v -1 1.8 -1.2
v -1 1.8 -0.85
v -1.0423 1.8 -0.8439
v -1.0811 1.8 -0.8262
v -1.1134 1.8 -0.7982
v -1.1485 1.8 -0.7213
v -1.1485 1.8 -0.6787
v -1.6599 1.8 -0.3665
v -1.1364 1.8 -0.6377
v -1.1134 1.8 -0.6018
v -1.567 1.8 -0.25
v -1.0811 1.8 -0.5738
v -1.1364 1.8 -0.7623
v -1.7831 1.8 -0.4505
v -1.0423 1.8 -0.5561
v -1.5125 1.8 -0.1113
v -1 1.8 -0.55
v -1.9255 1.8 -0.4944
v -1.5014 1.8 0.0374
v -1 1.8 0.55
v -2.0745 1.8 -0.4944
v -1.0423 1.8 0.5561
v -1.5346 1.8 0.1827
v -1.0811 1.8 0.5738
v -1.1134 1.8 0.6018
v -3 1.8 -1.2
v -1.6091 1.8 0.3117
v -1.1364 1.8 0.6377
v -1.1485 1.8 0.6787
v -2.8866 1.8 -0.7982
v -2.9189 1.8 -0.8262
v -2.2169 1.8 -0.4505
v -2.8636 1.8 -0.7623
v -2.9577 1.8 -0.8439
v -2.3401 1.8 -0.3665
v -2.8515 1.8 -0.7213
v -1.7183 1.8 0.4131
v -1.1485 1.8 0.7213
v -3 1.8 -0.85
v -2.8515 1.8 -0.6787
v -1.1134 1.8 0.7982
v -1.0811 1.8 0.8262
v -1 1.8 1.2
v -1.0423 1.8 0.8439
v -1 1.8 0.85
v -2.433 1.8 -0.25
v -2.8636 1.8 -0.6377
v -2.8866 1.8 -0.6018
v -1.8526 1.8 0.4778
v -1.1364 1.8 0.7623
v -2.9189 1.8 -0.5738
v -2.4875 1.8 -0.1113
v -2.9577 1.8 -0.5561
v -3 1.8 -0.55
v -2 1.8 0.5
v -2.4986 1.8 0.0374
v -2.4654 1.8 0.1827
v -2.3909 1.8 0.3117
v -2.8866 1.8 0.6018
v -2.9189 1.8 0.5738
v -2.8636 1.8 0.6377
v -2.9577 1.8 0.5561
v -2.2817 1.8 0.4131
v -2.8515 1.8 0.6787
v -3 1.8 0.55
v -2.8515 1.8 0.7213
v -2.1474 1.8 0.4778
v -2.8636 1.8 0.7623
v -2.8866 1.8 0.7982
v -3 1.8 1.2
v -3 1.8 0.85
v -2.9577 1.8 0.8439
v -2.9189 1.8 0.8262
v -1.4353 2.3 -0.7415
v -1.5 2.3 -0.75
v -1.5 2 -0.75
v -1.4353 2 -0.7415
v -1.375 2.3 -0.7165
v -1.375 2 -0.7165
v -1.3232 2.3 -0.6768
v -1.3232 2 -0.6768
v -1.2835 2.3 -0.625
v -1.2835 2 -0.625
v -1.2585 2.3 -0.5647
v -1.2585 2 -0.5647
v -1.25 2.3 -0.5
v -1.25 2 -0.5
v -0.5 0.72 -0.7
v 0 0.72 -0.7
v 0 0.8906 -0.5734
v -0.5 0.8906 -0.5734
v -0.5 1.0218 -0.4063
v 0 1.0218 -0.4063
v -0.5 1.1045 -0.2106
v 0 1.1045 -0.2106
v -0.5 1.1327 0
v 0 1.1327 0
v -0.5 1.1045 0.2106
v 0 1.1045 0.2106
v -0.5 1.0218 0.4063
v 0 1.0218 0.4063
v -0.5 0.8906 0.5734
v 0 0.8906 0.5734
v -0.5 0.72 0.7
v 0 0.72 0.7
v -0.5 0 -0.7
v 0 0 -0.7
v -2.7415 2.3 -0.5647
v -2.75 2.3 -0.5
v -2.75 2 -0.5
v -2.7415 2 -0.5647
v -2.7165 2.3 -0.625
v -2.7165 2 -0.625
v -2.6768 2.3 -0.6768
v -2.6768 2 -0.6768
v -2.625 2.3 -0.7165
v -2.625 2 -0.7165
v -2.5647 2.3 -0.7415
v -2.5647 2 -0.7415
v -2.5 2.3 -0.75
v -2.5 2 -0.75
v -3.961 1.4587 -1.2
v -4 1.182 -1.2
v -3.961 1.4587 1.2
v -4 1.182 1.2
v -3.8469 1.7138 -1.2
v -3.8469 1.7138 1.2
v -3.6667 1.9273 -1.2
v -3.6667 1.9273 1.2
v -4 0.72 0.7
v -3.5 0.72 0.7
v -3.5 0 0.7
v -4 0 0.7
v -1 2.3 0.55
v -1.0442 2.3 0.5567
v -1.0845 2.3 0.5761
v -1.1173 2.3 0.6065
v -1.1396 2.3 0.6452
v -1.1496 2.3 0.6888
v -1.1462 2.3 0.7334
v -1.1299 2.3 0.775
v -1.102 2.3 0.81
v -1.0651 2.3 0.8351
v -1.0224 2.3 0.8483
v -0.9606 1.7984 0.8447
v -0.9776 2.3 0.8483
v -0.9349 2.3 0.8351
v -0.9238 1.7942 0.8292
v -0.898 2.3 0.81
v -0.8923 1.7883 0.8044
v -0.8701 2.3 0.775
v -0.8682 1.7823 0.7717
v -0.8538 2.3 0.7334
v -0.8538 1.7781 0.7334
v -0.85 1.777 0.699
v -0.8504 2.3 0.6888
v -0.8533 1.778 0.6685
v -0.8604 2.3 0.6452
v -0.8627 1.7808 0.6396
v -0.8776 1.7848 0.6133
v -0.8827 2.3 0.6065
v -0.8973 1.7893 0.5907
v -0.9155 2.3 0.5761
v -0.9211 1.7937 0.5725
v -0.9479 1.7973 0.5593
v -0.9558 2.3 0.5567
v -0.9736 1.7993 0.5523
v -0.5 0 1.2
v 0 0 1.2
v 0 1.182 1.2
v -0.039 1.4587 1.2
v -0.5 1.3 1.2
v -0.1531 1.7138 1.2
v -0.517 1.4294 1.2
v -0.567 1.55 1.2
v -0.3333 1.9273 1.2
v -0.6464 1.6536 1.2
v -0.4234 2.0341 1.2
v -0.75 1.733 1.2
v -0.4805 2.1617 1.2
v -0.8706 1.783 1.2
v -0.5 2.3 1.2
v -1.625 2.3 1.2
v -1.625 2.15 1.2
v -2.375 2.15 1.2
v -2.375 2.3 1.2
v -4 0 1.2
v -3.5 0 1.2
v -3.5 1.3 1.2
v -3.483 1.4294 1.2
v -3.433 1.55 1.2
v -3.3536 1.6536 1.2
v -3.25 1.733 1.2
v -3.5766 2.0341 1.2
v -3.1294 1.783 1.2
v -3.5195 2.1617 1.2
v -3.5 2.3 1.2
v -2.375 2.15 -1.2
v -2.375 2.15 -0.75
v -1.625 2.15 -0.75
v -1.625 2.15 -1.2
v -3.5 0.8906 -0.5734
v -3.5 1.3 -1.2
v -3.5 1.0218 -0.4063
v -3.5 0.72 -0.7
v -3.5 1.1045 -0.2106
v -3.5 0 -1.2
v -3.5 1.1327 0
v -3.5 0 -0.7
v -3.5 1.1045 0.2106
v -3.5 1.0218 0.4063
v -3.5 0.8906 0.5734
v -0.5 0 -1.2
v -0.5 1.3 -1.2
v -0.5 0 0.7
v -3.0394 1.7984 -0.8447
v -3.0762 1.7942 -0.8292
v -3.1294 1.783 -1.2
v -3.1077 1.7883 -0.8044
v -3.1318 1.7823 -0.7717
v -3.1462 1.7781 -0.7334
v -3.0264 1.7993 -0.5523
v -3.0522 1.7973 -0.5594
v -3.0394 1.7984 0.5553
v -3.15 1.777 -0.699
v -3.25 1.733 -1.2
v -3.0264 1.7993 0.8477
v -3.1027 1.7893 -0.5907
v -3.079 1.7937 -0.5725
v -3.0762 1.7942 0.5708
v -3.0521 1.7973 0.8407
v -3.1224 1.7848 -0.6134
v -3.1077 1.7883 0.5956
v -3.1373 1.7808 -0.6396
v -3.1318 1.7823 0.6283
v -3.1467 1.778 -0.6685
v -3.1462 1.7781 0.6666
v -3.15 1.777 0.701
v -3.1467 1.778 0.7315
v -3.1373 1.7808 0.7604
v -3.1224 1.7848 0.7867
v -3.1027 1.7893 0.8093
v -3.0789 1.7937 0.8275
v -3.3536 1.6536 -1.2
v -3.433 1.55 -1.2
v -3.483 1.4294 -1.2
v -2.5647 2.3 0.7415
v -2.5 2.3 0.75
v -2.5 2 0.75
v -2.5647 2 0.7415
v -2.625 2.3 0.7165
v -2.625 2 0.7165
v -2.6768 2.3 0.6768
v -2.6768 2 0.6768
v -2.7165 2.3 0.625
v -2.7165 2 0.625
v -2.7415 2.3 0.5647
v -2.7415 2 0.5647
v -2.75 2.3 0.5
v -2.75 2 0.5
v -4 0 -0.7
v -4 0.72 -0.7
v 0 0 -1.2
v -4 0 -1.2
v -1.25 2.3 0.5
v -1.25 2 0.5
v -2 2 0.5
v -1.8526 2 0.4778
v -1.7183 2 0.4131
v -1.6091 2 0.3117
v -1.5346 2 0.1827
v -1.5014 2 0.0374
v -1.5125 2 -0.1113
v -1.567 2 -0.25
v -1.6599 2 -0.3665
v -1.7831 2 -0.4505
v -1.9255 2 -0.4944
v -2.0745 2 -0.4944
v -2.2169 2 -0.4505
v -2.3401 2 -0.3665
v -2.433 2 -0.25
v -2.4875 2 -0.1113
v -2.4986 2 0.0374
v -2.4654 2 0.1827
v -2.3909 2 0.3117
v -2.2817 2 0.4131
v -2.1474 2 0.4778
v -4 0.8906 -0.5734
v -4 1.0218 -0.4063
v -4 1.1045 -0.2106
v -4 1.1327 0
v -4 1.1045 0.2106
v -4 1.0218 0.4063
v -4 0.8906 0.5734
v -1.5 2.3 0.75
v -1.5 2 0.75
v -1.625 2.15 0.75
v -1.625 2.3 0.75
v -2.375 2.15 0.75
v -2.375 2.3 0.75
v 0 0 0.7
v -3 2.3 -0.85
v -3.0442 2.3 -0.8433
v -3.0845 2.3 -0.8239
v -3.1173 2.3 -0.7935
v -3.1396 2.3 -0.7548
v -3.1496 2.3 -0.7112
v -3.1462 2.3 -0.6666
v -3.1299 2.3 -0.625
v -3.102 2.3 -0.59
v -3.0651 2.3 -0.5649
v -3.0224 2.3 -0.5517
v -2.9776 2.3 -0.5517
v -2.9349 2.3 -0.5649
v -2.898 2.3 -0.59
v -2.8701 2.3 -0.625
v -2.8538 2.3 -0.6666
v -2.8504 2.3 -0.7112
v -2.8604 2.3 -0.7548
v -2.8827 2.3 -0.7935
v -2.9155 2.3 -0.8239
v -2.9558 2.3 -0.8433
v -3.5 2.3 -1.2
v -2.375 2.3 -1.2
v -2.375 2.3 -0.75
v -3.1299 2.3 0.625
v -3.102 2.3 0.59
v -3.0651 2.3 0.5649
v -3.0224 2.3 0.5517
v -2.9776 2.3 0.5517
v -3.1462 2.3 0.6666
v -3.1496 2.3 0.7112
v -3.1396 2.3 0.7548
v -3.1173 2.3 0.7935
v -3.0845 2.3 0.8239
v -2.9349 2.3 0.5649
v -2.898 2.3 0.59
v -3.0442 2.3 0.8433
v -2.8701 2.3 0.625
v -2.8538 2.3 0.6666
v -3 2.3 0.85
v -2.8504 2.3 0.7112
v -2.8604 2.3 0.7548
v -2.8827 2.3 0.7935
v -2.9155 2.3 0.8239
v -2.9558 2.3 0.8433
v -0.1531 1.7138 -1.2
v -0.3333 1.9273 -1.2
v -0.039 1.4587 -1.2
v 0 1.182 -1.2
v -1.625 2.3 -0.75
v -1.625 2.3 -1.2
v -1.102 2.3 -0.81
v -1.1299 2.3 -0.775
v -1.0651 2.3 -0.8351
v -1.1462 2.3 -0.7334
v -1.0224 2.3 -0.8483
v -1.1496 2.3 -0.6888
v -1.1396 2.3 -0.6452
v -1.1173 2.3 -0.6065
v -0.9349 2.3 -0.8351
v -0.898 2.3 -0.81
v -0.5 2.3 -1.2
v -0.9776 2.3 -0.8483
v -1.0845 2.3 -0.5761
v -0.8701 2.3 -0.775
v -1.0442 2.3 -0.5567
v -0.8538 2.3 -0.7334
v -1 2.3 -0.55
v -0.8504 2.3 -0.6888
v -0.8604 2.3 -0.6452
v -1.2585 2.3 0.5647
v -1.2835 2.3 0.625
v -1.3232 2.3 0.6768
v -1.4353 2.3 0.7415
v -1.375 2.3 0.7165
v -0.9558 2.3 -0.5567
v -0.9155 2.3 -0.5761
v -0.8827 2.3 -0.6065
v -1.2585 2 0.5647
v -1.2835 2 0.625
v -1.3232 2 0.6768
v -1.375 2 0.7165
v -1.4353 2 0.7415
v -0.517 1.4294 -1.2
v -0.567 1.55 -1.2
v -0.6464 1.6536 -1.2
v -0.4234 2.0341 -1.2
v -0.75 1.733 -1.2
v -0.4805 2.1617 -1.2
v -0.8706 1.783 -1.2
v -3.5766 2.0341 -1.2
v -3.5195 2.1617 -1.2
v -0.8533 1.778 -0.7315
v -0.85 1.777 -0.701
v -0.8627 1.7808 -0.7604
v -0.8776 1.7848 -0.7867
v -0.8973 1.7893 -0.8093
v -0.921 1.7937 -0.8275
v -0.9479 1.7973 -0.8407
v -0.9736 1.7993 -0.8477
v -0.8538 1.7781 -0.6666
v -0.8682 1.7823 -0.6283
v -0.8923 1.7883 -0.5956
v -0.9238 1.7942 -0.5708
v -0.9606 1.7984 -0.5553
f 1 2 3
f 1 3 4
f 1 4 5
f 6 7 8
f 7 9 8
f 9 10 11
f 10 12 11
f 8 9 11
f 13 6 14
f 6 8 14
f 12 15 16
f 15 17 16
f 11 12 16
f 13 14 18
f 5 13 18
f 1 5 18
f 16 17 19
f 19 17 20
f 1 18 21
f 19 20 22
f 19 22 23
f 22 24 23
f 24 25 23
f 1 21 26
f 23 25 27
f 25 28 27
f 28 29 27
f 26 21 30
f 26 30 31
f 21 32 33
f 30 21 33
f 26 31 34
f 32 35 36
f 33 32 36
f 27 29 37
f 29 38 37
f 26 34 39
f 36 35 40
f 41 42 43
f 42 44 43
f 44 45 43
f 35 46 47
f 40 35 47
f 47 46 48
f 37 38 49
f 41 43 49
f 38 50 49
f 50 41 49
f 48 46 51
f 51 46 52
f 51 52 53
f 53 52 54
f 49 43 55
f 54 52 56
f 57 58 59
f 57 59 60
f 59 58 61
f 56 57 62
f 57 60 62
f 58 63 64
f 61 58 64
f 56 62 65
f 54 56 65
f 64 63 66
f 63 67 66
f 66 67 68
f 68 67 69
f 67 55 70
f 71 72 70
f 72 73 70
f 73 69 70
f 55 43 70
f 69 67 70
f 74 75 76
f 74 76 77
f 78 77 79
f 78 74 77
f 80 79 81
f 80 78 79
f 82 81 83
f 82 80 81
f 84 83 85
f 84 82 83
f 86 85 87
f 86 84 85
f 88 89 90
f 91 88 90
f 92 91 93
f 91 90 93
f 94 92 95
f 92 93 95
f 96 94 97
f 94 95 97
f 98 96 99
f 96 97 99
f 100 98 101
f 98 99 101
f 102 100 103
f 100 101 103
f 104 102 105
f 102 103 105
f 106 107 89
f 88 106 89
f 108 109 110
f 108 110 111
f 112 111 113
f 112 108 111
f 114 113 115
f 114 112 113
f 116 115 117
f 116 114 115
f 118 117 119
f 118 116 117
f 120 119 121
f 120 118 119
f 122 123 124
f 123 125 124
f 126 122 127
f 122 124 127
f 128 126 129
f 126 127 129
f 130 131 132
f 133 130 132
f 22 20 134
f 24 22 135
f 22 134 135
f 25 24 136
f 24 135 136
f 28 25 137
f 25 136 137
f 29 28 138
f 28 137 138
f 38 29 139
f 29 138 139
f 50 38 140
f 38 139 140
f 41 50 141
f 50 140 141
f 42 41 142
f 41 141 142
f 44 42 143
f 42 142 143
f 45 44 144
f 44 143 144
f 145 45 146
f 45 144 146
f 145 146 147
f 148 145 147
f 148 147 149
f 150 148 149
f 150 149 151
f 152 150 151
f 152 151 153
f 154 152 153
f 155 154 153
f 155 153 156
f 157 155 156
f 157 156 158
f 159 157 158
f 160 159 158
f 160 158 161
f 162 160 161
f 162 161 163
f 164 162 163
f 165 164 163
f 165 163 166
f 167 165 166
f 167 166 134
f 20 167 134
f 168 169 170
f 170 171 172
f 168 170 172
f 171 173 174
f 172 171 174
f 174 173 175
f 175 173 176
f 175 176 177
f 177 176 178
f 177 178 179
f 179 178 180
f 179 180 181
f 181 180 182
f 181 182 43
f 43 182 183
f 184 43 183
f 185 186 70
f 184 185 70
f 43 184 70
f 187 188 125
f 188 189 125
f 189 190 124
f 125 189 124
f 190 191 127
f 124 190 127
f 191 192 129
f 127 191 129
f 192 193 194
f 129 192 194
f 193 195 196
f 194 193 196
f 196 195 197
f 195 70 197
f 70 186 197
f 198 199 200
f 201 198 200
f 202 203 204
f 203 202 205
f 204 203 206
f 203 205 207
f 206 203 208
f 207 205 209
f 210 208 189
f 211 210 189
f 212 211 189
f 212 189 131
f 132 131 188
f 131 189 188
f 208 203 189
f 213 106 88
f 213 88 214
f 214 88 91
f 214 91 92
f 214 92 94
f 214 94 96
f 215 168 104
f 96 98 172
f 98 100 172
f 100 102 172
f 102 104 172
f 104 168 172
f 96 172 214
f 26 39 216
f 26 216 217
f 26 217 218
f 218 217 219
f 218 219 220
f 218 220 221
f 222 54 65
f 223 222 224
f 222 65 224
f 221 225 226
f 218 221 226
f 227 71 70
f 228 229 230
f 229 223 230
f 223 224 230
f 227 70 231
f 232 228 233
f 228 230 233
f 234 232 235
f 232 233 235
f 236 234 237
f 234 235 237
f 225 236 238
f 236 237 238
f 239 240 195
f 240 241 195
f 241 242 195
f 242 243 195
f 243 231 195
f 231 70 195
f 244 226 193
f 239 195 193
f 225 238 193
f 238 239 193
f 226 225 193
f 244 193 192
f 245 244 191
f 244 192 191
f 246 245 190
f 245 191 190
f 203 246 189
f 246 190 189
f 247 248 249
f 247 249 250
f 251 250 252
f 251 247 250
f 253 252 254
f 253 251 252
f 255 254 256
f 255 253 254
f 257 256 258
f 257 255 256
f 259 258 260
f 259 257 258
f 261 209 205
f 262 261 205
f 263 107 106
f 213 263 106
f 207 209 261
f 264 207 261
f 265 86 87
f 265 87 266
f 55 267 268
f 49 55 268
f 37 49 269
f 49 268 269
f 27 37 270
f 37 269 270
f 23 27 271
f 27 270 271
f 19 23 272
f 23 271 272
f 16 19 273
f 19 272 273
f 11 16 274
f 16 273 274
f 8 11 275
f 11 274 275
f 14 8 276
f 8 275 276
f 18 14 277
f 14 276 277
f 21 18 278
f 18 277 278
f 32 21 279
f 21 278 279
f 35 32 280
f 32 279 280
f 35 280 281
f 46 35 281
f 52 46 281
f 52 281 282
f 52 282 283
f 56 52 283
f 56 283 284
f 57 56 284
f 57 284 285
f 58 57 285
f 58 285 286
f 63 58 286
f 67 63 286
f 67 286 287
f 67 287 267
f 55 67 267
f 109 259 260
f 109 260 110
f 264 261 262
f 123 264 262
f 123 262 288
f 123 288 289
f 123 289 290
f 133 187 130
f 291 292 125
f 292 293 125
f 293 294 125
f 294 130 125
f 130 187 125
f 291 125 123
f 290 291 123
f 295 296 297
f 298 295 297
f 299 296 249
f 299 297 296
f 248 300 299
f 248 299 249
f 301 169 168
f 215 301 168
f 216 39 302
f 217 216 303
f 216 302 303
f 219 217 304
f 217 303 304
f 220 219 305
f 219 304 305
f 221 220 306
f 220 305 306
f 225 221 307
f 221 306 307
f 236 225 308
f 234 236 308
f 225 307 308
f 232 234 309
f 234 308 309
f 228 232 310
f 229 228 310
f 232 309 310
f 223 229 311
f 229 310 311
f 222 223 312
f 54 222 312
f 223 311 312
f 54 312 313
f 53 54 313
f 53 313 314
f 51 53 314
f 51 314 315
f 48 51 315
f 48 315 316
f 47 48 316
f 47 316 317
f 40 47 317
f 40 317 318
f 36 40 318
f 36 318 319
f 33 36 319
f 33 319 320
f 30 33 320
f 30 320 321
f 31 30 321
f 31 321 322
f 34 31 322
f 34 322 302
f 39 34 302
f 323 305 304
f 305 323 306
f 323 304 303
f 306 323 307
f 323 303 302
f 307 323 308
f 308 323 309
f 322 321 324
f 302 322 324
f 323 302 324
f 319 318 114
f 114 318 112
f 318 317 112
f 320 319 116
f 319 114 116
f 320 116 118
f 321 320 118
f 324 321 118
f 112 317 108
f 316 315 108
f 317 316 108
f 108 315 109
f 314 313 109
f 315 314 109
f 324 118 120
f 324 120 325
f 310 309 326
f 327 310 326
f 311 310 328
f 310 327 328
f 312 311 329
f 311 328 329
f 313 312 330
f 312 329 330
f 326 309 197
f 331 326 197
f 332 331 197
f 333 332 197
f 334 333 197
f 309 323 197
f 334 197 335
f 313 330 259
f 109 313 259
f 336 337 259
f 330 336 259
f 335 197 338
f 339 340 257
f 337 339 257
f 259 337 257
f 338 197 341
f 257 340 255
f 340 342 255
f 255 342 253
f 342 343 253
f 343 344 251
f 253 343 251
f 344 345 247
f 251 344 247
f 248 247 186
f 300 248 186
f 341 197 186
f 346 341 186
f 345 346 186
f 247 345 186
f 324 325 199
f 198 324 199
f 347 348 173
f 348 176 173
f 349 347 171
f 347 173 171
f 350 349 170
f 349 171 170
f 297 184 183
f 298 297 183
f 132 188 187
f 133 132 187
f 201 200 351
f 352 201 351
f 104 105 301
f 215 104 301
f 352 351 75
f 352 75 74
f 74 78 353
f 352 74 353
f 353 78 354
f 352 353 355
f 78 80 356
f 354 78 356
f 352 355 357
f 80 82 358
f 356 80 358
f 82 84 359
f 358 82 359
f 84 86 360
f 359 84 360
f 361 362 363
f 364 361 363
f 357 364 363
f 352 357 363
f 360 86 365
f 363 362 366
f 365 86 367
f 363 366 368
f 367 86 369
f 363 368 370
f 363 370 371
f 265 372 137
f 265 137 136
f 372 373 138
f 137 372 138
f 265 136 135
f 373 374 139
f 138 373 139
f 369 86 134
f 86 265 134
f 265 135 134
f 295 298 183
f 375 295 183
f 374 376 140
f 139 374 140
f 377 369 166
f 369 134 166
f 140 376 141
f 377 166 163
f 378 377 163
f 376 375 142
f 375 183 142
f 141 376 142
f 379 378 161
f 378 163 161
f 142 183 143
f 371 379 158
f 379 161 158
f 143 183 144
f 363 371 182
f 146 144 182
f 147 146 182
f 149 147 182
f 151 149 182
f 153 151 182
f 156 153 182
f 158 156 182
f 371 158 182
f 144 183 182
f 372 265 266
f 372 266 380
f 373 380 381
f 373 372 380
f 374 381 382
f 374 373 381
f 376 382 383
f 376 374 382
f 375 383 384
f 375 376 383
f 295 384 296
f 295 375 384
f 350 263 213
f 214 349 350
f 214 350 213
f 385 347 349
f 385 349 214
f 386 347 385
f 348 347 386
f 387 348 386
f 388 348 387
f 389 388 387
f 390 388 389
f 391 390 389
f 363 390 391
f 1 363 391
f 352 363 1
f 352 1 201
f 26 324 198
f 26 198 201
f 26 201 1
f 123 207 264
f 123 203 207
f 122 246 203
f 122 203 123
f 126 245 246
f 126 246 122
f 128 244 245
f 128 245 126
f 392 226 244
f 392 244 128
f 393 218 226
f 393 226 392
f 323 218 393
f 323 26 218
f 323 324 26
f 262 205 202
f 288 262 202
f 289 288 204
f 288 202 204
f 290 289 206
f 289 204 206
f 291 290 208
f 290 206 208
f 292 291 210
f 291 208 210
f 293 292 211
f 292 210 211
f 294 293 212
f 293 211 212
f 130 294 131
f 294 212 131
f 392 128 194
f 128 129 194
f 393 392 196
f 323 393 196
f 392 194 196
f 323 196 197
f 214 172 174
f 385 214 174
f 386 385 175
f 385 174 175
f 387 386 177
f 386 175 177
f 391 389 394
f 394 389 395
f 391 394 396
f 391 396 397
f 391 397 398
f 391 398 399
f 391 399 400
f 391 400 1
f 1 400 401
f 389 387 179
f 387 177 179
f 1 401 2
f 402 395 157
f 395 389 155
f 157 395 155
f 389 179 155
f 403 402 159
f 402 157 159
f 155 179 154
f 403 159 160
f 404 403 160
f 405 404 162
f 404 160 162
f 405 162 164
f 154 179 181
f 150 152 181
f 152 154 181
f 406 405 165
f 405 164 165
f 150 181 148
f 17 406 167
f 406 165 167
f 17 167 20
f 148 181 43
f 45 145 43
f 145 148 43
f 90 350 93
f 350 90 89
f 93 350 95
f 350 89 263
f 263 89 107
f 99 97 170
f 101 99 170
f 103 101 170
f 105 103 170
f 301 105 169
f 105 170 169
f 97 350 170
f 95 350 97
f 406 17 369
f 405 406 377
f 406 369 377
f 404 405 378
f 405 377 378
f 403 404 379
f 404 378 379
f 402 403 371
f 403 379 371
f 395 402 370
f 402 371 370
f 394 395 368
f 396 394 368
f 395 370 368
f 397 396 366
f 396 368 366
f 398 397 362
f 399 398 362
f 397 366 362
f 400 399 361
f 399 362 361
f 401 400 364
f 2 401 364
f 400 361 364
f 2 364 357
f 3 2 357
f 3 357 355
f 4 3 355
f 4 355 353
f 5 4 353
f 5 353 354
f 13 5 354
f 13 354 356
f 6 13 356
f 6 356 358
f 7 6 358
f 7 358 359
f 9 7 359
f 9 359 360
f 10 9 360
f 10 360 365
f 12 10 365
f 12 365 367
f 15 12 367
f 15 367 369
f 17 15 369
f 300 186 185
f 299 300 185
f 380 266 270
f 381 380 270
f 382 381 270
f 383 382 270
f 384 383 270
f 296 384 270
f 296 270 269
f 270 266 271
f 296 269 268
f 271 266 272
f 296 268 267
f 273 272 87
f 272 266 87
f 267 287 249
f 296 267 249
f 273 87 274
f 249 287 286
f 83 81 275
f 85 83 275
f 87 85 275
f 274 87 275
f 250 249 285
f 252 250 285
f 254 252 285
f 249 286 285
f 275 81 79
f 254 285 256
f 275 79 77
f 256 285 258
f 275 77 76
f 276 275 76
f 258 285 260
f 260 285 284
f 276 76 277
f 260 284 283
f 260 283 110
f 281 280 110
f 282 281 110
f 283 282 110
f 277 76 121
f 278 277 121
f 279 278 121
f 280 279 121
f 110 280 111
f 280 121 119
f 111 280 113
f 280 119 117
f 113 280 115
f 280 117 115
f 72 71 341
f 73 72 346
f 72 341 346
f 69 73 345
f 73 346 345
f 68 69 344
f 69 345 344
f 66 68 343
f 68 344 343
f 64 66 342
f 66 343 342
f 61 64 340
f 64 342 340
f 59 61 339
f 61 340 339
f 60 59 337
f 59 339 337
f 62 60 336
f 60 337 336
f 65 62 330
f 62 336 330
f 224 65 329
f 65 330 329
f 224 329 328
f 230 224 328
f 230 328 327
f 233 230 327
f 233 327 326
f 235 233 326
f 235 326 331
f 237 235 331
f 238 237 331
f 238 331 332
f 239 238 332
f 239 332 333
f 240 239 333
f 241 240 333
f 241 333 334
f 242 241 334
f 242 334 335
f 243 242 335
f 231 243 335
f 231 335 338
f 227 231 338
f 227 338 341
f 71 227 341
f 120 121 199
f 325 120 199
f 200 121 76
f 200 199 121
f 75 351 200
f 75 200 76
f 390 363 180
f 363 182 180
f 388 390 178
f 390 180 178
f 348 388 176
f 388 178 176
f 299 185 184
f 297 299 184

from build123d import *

# Parameters (mm, degrees)
SALIENTE_EXTRUIR1_DEPTH = 1.2
CORTAR_EXTRUIR1_DEPTH   = 0.3
CROQUIS3_R              = 0.5
CORTAR_EXTRUIR2_DEPTH   = 5.630334761
CROQUIS4_R              = 0.15
CORTAR_EXTRUIR3_DEPTH   = 5.767598976
CORTAR_EXTRUIR4_DEPTH   = 5.76759905


with BuildPart() as part:
    # Croquis1 → Saliente-Extruir1 (new, symmetric)
    with BuildSketch(Plane.XY):
        with BuildLine():
            Line((-3.5, 0), (-4, 0))
            Line((-4, 0), (-4, 1.181966011))
            ThreePointArc((-4, 1.181966011), (-3.912870929, 1.590214302), (-3.666666667, 1.927322004))
            ThreePointArc((-3.666666667, 1.927322004), (-3.543564535, 2.095875855), (-3.5, 2.3))
            Line((-3.5, 2.3), (-2.375, 2.3))
            Line((-2.375, 2.3), (-2.375, 2.15))
            Line((-2.375, 2.15), (-1.625, 2.15))
            Line((-1.625, 2.15), (-1.625, 2.3))
            Line((-1.625, 2.3), (-0.5, 2.3))
            ThreePointArc((-0.5, 2.3), (-0.456435465, 2.095875855), (-0.333333333, 1.927322004))
            ThreePointArc((-0.333333333, 1.927322004), (-0.087129071, 1.590214302), (0, 1.181966011))
            Line((0, 1.181966011), (0, 0))
            Line((0, 0), (-0.5, 0))
            Line((-0.5, 0), (-0.5, 1.3))
            ThreePointArc((-0.5, 1.3), (-0.646446609, 1.653553391), (-1, 1.8))
            Line((-1, 1.8), (-3, 1.8))
            ThreePointArc((-3, 1.8), (-3.353553391, 1.653553391), (-3.5, 1.3))
            Line((-3.5, 1.3), (-3.5, 0))
        make_face()
    extrude(amount=SALIENTE_EXTRUIR1_DEPTH, both=True)

    # Croquis2 → Cortar-Extruir1 (cut)
    with BuildSketch(Plane(origin=(0, 2.3, 0), x_dir=(1, 0, 0), z_dir=(0, 1, 0))):
        with BuildLine():
            Line((-2.5, 0.75), (-1.5, 0.75))
            ThreePointArc((-1.5, 0.75), (-1.323223305, 0.676776695), (-1.25, 0.5))
            Line((-1.25, 0.5), (-1.25, -0.5))
            ThreePointArc((-1.25, -0.5), (-1.323223305, -0.676776695), (-1.5, -0.75))
            Line((-1.5, -0.75), (-2.5, -0.75))
            ThreePointArc((-2.5, -0.75), (-2.676776695, -0.676776695), (-2.75, -0.5))
            Line((-2.75, -0.5), (-2.75, 0.5))
            ThreePointArc((-2.75, 0.5), (-2.676776695, 0.676776695), (-2.5, 0.75))
        make_face()
    extrude(amount=-CORTAR_EXTRUIR1_DEPTH, mode=Mode.SUBTRACT)

    # Croquis3 → Cortar-Extruir2 (cut, through all)
    with BuildSketch(Plane(origin=(0, 2, 0), x_dir=(1, 0, 0), z_dir=(0, 1, 0))):
        with Locations(Location((-2, 0, 0), (0, 0, 270))):
            Circle(CROQUIS3_R)
    extrude(amount=-CORTAR_EXTRUIR2_DEPTH, mode=Mode.SUBTRACT)

    # Croquis4 → Cortar-Extruir3 (cut, through all)
    with BuildSketch(Plane(origin=(0, 2.3, 0), x_dir=(1, 0, 0), z_dir=(0, 1, 0))):
        with Locations(Location((-1, 0.7, 0), (0, 0, 270))):
            Circle(CROQUIS4_R)
        with Locations(Location((-3, 0.7, 0), (0, 0, 90))):
            Circle(CROQUIS4_R)
        with Locations(Location((-3, -0.7, 0), (0, 0, 270))):
            Circle(CROQUIS4_R)
        with Locations(Location((-1, -0.7, 0), (0, 0, 90))):
            Circle(CROQUIS4_R)
    extrude(amount=-CORTAR_EXTRUIR3_DEPTH, mode=Mode.SUBTRACT)

    # Croquis5 → Cortar-Extruir4 (cut, through all)
    with BuildSketch(Plane(origin=(0, 0, 0), x_dir=(0, 0, -1), z_dir=(1, 0, 0))):
        with BuildLine():
            Line((-0.7, 0), (0.7, 0))
            Line((0.7, 0), (0.7, 0.72))
            ThreePointArc((0.7, 0.72), (0, 1.132701665), (-0.7, 0.72))
            Line((-0.7, 0.72), (-0.7, 0))
        make_face()
    extrude(amount=-CORTAR_EXTRUIR4_DEPTH, mode=Mode.SUBTRACT)


solid = part.part
